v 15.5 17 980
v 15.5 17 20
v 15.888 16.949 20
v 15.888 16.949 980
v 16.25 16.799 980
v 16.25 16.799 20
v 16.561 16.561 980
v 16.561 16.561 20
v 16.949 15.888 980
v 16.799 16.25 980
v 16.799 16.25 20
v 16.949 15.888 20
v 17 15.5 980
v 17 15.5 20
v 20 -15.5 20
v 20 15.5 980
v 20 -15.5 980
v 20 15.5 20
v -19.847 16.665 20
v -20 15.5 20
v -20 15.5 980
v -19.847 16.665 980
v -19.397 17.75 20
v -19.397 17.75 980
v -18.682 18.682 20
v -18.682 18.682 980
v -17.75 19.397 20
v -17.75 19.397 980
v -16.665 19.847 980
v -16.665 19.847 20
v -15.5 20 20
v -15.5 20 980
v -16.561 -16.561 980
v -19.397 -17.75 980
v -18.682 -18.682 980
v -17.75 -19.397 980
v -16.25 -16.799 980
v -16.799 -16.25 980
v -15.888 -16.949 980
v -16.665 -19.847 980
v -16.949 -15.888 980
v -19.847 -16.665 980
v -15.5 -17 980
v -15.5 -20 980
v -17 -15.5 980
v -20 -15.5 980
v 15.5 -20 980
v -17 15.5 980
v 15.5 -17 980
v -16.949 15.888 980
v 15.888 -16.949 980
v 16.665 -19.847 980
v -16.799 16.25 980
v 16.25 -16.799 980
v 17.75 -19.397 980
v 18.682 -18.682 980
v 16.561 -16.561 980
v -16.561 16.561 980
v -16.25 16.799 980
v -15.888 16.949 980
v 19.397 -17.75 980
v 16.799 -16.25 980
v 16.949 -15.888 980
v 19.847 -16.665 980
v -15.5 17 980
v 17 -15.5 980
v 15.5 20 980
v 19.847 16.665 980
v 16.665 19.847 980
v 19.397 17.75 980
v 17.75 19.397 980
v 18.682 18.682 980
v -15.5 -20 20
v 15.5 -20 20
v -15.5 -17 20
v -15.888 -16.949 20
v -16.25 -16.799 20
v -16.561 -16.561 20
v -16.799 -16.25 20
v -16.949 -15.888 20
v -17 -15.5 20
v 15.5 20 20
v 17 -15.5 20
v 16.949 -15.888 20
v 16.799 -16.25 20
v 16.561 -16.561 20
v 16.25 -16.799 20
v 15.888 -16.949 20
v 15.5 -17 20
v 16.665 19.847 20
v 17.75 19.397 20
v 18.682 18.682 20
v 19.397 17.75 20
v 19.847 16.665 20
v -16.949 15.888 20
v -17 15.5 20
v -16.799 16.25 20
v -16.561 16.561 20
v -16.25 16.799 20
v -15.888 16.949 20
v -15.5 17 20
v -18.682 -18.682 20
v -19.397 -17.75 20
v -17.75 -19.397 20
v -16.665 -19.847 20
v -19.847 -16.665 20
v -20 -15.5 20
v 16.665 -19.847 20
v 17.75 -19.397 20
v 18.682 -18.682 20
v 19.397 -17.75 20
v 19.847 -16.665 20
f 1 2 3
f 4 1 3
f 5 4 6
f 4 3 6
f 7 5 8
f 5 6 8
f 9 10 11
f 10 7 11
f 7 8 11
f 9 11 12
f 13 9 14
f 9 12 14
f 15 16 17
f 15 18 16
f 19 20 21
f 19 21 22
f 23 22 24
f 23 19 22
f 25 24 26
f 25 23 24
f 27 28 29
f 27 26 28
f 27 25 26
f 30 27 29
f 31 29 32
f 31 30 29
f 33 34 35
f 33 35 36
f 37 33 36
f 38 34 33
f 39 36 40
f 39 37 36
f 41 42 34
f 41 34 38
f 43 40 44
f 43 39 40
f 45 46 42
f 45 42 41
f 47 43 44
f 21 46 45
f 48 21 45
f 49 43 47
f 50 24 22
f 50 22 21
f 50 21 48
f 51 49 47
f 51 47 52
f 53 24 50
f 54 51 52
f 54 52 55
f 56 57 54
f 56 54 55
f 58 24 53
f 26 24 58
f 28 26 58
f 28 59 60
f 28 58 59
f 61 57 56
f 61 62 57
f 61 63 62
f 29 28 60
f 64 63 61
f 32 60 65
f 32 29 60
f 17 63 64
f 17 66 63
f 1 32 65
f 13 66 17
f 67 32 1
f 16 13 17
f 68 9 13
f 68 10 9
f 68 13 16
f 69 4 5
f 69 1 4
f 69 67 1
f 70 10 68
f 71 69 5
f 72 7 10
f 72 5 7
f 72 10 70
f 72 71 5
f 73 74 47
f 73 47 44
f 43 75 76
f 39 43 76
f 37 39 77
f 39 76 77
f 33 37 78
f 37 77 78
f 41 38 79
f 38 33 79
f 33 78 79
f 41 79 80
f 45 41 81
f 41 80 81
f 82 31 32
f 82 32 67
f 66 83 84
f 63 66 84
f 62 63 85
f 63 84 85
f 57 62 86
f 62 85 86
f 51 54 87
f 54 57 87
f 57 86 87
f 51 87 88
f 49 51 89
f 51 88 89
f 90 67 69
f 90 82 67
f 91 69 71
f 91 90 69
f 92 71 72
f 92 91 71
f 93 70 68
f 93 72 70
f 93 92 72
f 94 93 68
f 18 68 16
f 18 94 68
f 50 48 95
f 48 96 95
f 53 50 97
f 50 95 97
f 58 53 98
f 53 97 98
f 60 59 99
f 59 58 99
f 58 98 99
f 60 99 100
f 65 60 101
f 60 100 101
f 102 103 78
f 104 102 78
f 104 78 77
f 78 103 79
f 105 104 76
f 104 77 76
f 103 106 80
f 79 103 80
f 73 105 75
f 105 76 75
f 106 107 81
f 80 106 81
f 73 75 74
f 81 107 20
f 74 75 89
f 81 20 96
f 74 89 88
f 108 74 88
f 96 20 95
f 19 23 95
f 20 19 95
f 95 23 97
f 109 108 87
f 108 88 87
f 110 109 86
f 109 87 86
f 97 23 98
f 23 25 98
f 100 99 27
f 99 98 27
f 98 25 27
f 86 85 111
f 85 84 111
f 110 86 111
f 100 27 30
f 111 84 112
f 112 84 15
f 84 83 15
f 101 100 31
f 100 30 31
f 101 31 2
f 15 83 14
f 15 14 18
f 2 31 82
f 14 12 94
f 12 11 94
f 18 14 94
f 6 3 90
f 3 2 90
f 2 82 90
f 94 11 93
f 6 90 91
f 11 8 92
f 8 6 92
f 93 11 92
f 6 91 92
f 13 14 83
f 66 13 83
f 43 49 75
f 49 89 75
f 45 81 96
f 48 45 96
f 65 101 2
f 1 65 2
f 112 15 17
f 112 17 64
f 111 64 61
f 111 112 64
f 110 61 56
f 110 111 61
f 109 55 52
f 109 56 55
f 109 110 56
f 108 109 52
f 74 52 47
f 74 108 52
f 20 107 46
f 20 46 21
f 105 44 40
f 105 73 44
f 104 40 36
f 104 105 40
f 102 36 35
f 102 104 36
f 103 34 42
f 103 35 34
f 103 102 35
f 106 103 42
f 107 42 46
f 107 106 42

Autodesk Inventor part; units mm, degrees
ref_plane "Start Plane" through (0, 0, 20) normal (0, 0, 1) x (1, 0, 0)
ref_plane "End Plane" through (0, 0, 980) normal (0, 0, 1) x (1, 0, 0)
sketch "Sketch" plane through (0, 0, 0) normal (0, 0, 1) x (1, 0, 0)
  line L0 (-20, -15.5) -> (-20, 15.5)
  line L1 (-15.5, 20) -> (15.5, 20)
  line L2 (20, 15.5) -> (20, -15.5)
  line L3 (15.5, -20) -> (-15.5, -20)
  arc A0 (-20, -15.5) -> (-15.5, -20) centre (-15.5, -15.5) ccw
  arc A1 (-15.5, 20) -> (-20, 15.5) centre (-15.5, 15.5) ccw
  arc A2 (20, 15.5) -> (15.5, 20) centre (15.5, 15.5) ccw
  arc A3 (15.5, -20) -> (20, -15.5) centre (15.5, -15.5) ccw
  arc A4 (-15.5, 17) -> (-17, 15.5) centre (-15.5, 15.5) ccw
  line L4 (-15.5, 17) -> (15.5, 17)
  arc A5 (17, 15.5) -> (15.5, 17) centre (15.5, 15.5) ccw
  line L5 (17, 15.5) -> (17, -15.5)
  arc A6 (15.5, -17) -> (17, -15.5) centre (15.5, -15.5) ccw
  line L6 (15.5, -17) -> (-15.5, -17)
  arc A7 (-17, -15.5) -> (-15.5, -17) centre (-15.5, -15.5) ccw
  line L7 (-17, -15.5) -> (-17, 15.5)
  line L8 (0, 29.3048) -> (0, -29.3048) construction
  line L9 (-29.3048, 0) -> (29.3048, 0) construction
  dimension "d7" = 4.5
  dimension "d10" = 40
  dimension "d11" = 40
  dimension "d12" = 3
  dimension "d15" = 20
  dimension "d16" = 20
extrude "Body" add sketch "Sketch" along normal up to surface (960 mm away) from surface at 20
sketch "Sketch3" plane through (0, 0, 0) normal (0, 0, 1) x (1, 0, 0)
  line L0 (0, 0) -> (10, 0)
ref_plane "Work Plane3" through (0, 0, 0) normal (0, -1, 0) x (1, 0, 0)
ref_plane "Work Plane4" through (-15.5, 1520, 20) normal (0, 0, -1) x (-1, 0, 0)
split "Split1" plane through (-15.5, 1520, 20) removes the side toward (0, 0, -1)
ref_plane "Work Plane5" through (15.5, 1520, 980) normal (0, 0, 1) x (1, 0, 0)
split "Split2" plane through (15.5, 1520, 980) removes the side toward (0, 0, 1)
sketch "Sketch4" plane through (0, 0, 0) normal (0, -1, 0) x (1, 0, 0)
  line L0 (-2, 20) -> (12, 20) projected
  line L1 (-2, 980) -> (12, 980) projected
  dimension "d18" = 960
equation "\"d7\" = G_IR"
equation "\"d10\" = G_H"
equation "\"d11\" = G_W"
equation "\"d12\" = G_T"
equation "\"d15\" = 0.5 * d10"
equation "\"d16\" = 0.5 * d11"
equation "\"d3\" = G_L"
equation "\"G_W\" = 40"
equation "\"G_H\" = 40"
equation "\"G_T\" = 3"
equation "\"G_IR\" = 4.5"
equation "\"G_L\" = d18"
properties part number "ISO 12633-2 - 40x40x3 - 960" material "Steel, Mild"
